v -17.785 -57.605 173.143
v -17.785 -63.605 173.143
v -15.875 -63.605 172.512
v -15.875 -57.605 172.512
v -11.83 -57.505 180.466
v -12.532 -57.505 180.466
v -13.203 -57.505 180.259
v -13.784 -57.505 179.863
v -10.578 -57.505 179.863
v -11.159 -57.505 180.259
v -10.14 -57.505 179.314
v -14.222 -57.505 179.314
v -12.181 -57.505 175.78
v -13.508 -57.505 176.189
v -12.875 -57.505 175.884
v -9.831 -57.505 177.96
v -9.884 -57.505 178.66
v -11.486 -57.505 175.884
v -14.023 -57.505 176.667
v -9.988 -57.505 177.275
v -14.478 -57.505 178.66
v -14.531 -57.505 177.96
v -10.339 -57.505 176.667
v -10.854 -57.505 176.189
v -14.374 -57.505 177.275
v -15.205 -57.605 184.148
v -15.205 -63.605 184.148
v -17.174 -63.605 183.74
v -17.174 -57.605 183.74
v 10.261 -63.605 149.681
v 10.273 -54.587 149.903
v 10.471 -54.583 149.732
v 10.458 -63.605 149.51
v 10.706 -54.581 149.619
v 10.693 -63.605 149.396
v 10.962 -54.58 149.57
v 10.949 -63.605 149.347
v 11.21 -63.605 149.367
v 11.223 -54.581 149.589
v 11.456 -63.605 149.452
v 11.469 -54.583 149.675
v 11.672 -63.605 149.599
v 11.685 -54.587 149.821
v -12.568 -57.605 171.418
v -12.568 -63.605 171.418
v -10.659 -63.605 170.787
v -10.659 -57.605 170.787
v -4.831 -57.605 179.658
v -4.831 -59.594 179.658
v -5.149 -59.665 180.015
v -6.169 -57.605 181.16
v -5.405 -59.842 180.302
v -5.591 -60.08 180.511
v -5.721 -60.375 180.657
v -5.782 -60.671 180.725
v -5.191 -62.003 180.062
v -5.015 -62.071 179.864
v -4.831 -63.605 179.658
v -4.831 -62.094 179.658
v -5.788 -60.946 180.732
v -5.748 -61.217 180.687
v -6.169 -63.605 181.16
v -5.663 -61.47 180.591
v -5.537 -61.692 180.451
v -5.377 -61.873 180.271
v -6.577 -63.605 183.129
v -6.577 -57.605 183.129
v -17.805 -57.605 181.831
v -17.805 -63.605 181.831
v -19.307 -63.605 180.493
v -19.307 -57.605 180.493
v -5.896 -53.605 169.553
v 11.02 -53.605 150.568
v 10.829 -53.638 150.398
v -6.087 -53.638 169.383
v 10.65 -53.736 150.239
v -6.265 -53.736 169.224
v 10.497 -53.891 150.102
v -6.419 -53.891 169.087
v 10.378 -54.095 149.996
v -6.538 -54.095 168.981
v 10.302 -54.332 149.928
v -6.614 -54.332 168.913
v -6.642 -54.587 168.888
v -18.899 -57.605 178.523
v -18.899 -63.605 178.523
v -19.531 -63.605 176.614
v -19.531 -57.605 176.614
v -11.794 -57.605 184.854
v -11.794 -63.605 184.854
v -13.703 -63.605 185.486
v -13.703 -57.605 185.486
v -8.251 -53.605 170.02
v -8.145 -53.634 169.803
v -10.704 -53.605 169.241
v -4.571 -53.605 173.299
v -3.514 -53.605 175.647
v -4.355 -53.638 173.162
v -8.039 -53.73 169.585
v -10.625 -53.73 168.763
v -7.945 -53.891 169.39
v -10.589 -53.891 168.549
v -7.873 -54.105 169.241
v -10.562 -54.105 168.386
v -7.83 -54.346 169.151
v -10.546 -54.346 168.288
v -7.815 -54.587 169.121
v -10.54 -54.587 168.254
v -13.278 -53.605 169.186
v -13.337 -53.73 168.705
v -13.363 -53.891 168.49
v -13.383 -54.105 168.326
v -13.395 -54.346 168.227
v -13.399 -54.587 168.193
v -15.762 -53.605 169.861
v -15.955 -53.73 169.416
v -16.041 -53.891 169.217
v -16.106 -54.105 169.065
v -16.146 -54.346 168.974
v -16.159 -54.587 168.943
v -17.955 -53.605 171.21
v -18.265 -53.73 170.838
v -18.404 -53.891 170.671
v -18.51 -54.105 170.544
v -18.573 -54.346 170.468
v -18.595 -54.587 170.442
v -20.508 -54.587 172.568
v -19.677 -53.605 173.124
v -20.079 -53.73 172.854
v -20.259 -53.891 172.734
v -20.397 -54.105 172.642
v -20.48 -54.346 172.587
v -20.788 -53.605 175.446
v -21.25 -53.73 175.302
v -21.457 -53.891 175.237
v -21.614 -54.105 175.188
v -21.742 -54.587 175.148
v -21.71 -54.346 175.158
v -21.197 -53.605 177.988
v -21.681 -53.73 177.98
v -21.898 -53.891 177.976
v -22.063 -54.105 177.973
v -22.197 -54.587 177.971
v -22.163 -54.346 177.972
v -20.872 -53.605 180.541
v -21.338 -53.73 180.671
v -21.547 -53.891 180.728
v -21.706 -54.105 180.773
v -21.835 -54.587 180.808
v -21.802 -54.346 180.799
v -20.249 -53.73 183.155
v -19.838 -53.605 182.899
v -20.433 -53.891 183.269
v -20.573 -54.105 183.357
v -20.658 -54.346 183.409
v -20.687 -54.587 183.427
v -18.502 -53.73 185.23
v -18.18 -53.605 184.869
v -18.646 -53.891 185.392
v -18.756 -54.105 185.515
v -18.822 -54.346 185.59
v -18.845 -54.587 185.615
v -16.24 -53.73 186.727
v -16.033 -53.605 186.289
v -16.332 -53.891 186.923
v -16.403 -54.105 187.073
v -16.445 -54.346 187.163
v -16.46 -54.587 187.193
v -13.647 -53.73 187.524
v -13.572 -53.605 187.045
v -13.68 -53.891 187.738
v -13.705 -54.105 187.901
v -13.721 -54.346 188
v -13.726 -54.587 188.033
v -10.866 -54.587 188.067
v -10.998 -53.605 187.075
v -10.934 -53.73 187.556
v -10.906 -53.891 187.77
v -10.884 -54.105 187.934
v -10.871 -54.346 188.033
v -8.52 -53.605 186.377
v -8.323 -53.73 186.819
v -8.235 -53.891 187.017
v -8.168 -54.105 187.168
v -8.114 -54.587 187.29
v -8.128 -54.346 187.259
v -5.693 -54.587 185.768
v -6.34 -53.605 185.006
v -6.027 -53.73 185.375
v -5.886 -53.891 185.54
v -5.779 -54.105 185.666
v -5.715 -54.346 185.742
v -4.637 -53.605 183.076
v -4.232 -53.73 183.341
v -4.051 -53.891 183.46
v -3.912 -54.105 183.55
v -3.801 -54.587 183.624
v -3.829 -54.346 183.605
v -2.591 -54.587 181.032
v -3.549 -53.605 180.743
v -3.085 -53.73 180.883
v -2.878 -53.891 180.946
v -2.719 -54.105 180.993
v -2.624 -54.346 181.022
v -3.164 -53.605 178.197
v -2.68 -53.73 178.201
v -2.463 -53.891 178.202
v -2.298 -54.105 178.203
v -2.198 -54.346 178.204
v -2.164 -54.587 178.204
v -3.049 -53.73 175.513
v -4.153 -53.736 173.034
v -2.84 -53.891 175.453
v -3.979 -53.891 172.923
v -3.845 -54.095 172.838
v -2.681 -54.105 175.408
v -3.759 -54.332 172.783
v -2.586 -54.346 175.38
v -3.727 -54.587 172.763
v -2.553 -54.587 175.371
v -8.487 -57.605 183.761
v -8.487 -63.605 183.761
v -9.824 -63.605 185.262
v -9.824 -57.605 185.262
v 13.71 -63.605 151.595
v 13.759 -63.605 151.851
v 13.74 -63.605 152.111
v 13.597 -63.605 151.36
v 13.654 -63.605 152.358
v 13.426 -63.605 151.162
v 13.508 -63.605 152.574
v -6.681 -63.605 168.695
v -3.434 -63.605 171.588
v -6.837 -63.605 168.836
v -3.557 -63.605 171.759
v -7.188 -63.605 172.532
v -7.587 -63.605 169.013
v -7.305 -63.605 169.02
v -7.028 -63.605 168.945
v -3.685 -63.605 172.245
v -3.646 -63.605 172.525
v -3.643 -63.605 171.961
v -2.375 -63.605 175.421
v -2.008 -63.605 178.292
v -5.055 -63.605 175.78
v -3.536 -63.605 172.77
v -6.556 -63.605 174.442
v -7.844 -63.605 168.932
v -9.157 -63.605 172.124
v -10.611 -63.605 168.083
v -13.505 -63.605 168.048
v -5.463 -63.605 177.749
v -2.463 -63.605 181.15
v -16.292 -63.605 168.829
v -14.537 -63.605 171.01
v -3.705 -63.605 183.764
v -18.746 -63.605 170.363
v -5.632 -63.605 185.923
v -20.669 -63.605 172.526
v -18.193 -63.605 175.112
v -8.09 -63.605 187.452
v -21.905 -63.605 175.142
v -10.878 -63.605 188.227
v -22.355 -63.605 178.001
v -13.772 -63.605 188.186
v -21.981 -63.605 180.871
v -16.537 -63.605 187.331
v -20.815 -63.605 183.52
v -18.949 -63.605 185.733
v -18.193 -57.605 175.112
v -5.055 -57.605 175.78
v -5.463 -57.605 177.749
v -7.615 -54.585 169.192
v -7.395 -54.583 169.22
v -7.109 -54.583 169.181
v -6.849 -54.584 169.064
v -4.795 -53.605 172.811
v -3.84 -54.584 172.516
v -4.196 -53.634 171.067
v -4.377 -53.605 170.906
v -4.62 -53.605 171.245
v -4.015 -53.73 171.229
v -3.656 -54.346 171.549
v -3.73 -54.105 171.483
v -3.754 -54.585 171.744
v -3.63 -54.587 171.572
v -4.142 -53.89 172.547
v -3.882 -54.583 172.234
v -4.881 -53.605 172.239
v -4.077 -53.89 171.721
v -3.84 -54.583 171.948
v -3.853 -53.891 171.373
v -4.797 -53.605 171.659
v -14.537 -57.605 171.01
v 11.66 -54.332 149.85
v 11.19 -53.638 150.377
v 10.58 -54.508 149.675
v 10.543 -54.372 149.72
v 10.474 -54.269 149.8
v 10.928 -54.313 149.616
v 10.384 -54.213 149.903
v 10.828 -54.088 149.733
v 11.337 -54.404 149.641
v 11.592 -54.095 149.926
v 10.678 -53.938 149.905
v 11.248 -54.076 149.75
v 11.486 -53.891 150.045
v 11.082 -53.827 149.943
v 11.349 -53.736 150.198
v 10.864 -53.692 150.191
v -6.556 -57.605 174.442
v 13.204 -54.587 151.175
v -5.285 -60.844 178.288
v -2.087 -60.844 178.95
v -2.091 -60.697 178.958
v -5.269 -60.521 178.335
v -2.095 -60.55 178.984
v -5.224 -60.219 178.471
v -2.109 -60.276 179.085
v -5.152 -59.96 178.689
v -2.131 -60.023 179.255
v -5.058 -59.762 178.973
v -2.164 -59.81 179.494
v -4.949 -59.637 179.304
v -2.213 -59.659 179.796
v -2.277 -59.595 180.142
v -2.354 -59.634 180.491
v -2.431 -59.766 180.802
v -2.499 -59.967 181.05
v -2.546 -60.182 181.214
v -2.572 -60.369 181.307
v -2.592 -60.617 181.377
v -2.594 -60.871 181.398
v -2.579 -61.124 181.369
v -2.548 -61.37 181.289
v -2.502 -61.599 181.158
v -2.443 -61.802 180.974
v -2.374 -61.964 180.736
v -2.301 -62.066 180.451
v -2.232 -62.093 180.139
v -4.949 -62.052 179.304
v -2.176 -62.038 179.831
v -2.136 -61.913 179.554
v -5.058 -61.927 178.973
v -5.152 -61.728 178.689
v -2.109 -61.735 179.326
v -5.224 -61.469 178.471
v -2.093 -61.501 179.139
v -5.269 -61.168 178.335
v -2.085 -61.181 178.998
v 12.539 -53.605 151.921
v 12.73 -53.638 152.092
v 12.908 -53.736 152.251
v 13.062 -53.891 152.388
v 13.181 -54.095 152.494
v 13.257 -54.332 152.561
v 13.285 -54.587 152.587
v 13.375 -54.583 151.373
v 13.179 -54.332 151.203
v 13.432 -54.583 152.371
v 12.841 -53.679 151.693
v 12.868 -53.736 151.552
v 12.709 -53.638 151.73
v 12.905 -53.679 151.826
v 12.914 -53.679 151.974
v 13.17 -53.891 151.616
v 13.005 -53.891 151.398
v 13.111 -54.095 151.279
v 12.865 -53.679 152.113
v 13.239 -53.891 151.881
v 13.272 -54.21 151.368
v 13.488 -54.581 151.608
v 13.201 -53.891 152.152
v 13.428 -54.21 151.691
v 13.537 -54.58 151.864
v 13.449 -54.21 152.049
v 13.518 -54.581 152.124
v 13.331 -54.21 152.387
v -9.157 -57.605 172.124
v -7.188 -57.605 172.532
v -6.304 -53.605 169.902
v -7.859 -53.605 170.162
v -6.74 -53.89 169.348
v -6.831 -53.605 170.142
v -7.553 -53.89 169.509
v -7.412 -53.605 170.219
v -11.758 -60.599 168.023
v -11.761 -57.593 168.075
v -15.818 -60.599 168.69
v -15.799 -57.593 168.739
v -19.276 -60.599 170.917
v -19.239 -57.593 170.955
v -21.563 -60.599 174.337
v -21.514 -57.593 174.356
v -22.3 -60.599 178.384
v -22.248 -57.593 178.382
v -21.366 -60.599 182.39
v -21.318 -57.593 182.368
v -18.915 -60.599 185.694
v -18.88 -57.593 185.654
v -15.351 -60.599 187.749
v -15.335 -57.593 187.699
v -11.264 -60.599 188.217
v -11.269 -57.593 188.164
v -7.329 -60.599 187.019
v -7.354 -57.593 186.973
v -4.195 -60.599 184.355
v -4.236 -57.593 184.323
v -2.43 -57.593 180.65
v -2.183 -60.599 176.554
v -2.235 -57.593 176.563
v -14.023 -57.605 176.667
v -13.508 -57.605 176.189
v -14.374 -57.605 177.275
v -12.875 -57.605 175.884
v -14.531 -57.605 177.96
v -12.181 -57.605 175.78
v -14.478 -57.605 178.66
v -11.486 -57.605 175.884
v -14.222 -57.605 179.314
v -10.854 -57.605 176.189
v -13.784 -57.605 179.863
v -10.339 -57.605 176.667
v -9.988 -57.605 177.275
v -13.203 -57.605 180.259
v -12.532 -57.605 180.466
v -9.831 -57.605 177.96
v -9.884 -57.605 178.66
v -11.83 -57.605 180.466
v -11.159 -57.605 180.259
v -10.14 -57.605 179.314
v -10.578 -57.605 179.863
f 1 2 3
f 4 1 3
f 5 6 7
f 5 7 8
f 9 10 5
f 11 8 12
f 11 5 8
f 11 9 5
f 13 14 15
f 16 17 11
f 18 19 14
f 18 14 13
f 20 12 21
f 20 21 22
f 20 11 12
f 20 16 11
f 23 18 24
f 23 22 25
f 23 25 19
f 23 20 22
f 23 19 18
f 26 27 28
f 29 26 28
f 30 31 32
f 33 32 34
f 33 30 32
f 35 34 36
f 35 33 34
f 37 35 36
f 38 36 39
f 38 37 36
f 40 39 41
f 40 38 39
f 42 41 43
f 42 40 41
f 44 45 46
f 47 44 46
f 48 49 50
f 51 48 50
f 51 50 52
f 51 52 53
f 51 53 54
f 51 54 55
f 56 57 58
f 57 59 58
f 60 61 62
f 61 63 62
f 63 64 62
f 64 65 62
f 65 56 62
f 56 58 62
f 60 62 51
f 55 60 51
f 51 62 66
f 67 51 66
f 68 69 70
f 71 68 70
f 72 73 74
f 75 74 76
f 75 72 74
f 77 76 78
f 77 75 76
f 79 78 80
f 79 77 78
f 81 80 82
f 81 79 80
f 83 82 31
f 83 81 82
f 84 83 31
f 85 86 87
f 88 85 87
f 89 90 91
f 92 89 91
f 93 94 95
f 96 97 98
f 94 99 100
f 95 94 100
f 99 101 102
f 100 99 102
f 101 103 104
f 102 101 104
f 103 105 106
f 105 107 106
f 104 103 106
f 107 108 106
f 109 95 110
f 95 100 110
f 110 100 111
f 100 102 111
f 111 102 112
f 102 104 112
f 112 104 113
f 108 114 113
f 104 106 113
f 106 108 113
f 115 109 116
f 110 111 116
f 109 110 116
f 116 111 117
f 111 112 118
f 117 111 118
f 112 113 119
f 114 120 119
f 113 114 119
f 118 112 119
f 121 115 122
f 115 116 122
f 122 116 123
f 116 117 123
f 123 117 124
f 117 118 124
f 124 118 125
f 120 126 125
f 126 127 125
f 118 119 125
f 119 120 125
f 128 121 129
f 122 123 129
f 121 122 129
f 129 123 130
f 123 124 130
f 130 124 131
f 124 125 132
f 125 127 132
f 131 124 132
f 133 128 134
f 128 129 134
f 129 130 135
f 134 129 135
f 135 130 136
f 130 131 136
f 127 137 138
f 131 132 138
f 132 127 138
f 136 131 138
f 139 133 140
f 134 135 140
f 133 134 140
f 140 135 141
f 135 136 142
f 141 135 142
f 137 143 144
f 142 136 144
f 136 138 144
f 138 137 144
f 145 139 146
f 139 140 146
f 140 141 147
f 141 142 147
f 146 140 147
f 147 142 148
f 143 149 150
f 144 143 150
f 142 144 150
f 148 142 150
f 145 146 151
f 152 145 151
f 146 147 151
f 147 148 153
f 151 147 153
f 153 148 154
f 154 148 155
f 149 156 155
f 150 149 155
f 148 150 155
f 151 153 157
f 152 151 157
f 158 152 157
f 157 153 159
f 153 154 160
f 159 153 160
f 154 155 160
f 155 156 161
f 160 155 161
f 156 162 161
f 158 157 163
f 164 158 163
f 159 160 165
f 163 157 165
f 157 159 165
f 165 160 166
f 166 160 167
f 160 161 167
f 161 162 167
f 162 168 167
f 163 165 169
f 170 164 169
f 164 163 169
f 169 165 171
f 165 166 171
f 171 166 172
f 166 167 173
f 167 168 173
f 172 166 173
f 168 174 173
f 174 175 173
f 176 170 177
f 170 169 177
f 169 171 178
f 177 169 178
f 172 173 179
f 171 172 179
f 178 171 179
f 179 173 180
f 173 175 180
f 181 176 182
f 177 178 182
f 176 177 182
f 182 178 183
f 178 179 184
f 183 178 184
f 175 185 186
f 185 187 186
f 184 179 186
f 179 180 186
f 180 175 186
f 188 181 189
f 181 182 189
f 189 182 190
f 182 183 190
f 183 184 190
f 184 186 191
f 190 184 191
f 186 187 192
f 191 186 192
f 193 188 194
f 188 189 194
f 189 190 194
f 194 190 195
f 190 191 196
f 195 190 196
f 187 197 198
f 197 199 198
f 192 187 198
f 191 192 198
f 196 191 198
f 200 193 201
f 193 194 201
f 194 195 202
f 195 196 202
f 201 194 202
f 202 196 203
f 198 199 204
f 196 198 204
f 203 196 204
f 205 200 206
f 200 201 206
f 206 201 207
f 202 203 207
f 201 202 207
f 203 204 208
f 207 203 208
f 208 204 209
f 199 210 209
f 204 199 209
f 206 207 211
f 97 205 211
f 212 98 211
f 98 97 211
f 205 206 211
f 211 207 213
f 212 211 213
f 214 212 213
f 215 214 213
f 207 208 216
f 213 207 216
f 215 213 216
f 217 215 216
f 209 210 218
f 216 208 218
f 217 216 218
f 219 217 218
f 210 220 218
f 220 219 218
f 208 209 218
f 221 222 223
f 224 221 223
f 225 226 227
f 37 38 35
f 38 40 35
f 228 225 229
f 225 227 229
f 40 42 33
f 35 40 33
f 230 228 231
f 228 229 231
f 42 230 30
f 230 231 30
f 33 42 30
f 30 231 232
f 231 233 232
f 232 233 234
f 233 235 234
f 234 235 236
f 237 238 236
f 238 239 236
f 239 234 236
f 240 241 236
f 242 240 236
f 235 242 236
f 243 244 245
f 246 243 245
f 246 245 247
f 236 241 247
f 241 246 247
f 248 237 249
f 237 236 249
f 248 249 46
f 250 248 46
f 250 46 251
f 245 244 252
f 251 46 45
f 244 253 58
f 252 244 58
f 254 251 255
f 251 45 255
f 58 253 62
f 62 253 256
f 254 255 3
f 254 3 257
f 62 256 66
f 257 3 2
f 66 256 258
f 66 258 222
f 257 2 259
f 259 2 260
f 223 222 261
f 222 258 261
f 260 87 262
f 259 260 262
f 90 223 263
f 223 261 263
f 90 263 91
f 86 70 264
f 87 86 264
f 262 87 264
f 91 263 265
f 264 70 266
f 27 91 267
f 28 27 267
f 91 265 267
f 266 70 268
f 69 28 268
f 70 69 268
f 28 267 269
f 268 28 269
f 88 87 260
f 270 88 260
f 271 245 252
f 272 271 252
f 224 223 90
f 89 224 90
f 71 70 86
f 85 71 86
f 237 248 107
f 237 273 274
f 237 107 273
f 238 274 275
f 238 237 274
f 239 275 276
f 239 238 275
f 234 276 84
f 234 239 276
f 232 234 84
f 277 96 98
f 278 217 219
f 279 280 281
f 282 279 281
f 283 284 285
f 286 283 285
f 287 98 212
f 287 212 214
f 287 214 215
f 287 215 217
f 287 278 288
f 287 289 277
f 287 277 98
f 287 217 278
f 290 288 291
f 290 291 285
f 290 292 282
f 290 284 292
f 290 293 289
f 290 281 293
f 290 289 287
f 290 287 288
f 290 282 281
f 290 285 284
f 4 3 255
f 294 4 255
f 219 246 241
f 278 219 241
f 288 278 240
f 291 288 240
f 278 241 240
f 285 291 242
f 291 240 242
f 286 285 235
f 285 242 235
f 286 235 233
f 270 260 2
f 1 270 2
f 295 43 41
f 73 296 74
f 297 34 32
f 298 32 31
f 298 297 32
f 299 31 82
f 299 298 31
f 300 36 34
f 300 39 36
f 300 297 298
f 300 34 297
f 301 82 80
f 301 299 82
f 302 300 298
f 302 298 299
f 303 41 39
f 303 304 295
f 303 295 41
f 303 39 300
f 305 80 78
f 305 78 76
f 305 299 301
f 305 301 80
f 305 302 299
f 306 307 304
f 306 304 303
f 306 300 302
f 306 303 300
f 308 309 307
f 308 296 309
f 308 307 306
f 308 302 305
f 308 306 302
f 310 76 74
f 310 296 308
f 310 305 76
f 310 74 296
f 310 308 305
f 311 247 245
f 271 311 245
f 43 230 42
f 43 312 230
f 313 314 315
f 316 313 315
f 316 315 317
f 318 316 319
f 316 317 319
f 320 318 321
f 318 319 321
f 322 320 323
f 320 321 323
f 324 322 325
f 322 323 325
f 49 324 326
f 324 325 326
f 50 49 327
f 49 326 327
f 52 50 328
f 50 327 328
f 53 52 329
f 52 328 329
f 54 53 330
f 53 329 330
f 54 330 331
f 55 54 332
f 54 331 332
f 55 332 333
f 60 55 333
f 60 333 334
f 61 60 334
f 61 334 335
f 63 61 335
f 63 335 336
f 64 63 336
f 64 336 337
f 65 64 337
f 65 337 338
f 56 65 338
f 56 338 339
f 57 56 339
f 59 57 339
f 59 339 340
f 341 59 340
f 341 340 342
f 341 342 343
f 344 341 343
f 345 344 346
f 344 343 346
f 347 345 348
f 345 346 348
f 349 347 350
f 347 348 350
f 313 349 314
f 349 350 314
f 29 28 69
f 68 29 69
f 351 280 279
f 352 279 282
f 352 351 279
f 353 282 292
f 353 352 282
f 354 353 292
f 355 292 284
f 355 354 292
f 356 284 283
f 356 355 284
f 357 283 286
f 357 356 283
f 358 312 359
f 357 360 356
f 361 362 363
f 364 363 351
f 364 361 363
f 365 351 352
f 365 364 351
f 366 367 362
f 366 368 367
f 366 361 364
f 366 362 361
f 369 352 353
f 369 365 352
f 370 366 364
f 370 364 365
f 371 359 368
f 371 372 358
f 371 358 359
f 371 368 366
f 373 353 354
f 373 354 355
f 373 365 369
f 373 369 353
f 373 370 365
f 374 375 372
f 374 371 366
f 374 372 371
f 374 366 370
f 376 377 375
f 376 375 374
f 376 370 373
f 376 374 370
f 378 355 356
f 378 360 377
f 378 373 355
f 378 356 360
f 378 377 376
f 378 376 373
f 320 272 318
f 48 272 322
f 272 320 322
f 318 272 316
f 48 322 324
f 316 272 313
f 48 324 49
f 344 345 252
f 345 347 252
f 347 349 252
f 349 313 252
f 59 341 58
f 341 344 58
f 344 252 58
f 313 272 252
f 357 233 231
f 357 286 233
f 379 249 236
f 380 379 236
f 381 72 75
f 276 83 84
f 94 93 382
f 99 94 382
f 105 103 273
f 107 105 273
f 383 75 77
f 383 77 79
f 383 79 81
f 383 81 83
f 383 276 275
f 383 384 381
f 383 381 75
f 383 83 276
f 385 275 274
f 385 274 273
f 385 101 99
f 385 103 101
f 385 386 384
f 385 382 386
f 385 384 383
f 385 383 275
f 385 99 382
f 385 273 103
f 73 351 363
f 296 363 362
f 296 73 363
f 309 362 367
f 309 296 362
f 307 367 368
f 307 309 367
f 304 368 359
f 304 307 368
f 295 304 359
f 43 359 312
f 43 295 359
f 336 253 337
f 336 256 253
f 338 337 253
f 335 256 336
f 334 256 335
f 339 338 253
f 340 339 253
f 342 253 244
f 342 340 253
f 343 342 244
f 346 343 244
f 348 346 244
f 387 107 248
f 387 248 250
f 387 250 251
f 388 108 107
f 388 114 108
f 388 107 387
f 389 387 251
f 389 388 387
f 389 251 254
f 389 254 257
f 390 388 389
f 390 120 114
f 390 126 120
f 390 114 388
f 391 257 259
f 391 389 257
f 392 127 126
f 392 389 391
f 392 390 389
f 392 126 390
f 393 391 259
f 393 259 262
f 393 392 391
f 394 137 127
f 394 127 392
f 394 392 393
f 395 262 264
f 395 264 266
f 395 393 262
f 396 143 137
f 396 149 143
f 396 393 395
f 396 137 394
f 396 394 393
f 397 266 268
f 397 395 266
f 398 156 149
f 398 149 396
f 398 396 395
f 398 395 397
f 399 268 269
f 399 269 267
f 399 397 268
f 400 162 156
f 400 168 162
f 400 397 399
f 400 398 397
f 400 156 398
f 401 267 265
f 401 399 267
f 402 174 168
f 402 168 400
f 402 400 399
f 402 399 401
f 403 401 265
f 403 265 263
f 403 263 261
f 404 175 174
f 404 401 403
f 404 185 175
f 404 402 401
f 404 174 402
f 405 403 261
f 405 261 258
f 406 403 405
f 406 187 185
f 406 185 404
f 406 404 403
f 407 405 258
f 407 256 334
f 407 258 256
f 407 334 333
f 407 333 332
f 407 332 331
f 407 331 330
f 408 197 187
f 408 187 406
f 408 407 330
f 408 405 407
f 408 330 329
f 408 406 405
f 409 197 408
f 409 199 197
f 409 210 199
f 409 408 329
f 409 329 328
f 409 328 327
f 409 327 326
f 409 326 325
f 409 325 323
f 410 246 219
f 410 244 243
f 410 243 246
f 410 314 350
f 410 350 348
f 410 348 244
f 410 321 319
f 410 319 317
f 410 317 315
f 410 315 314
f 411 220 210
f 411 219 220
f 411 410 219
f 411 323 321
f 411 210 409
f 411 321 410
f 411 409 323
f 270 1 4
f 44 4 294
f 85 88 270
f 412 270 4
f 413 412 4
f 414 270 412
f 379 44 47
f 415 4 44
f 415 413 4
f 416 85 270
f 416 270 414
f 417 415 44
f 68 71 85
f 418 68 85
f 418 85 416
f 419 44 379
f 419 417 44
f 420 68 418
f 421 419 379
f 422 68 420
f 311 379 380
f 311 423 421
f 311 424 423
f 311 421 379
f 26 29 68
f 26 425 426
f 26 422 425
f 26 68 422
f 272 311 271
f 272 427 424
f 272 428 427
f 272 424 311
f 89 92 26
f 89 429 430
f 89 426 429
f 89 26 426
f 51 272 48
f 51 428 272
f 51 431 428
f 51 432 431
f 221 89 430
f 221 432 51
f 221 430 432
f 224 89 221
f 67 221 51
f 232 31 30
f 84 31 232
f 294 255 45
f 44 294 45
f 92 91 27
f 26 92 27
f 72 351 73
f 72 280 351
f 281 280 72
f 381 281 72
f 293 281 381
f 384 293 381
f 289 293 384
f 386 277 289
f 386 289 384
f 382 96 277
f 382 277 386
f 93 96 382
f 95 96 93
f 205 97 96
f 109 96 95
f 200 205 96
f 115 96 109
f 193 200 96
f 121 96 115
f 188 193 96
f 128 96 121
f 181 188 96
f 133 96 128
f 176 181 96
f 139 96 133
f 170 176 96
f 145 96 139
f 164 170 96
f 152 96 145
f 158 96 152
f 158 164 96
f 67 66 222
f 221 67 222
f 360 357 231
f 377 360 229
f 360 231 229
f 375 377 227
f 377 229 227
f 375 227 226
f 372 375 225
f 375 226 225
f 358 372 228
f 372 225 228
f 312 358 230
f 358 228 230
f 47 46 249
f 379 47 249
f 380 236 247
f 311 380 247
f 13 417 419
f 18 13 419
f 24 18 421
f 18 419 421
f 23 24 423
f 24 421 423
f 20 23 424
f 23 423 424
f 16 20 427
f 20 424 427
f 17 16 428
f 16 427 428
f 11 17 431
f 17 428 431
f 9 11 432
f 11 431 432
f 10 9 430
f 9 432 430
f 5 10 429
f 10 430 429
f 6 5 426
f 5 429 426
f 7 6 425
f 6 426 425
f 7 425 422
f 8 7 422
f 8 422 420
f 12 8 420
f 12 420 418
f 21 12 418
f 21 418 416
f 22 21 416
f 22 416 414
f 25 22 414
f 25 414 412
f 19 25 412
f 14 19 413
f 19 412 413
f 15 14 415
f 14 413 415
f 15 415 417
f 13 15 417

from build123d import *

# Parameters (mm, degrees)
BOSS_EXTRU_1_DEPTH      = 10
BOSS_EXTRU_1_DRAFT      = 1
PER_AGE1_D              = 13
PER_AGE1_DEPTH          = 6
CONG_1_R                = 0.991556173
CONG_2_R                = 0.991556172
CONG_3_R                = 1
ENL_V_MAT_EXTRU_1_DEPTH = 6
ESQUISSE7_R             = 2.35630159
ENL_V_MAT_EXTRU_2_DEPTH = 0.1
TROU_TARAUD_M31_D       = 2.5
TROU_TARAUD_M31_DEPTH   = 8.5
TROU_TARAUD_M31_TIP     = 0.751075774


with BuildPart() as part:
    # Esquisse1 → Boss.-Extru.1 (with draft: the straight prism first)
    with BuildSketch(Plane(origin=(0, -53.604561249, 0), x_dir=(-1, 0, 0), z_dir=(0, 1, 0))):
        with BuildLine():
            Line((4.169645588, 172.151181972), (-13.92635809, 151.841438325))
            Line((-13.92635809, 151.841438325), (-10.939855184, 149.180460987))
            Line((-10.939855184, 149.180460987), (7.156148495, 169.490204634))
            ThreePointArc((7.156148495, 169.490204634), (18.83337708, 185.602358804), (4.169645588, 172.151181972))
        make_face()
    extrude(amount=-BOSS_EXTRU_1_DEPTH)
    # Boss.-Extru.1: the draft: its side faces are tilted about the plane it starts from
    boss_extru_1_sides = [part.faces().sort_by_distance(p)[0] for p in [
        (4.878356251, -58.604561249, 161.996310148),
        (12.433106637, -58.604561249, 150.510949656),
        (1.891853345, -58.604561249, 159.33533281),
        (-18.83337708, -58.604561249, 185.602358804),
    ]]
    draft(boss_extru_1_sides, Plane(origin=(0, -53.604561249, 0), x_dir=(-1, 0, 0), z_dir=(0, 1, 0)), BOSS_EXTRU_1_DRAFT)

    # Perçage1
    with Locations(Plane.XZ.offset(63.604561249)):
        with Locations((-12.180933736, 178.136101538)):
            Hole(PER_AGE1_D / 2, depth=PER_AGE1_DEPTH)

    # Congé1
    cong_1_edges = [part.edges().sort_by_distance(p)[0] for p in [
        (-7.174076316, -58.604557662, 169.379132828),
    ]]
    fillet(cong_1_edges, radius=CONG_1_R)

    # Congé2
    cong_2_edges = [part.edges().sort_by_distance(p)[0] for p in [
        (-4.057249498, -58.604557662, 172.156228913),
    ]]
    fillet(cong_2_edges, radius=CONG_2_R)

    # Congé3
    cong_3_edges = [part.edges().sort_by_distance(p)[0] for p in [
        (14.049579508, -58.604561249, 151.834335737),
        (12.433106637, -53.604561249, 150.510949656),
        (10.932752597, -58.604561249, 149.057239569),
        (5.137318128, -53.604561249, 161.705668665),
        (2.150815222, -53.604561249, 159.044691328),
        (-3.899737977, -53.604561249, 172.149959021),
        (-7.185946015, -53.604561249, 169.221944085),
        (-18.83337708, -53.604561249, 185.602358804),
    ]]
    fillet(cong_3_edges, radius=CONG_3_R)

    # Esquisse6 → Enlèv. mat.-Extru.1 (cut)
    with BuildSketch(Plane.XZ.offset(63.604561249)):
        Polygon((-6.577094401, 183.12912848), (-8.486502447, 183.760565155), (-9.824379984, 185.262109379), (-11.793694196, 184.854245557), (-13.703102242, 185.485682232), (-15.204646466, 184.147804695), (-17.173960678, 183.739940873), (-17.805397352, 181.830532827), (-19.306941577, 180.49265529), (-18.899077755, 178.523341078), (-19.530514429, 176.613933032), (-18.192636892, 175.112388808), (-17.78477307, 173.143074596), (-15.875365024, 172.511637922), (-14.537487487, 171.010093697), (-12.568173276, 171.417957519), (-10.658765229, 170.786520845), (-9.157221005, 172.124398382), (-7.187906794, 172.532262204), (-6.556470119, 174.44167025), (-5.054925895, 175.779547787), (-5.462789717, 177.748861998), (-4.831353042, 179.658270044), (-6.169230579, 181.159814269), align=None)
    extrude(amount=-ENL_V_MAT_EXTRU_1_DEPTH, mode=Mode.SUBTRACT)

    # Esquisse7 → Enlèv. mat.-Extru.2 (cut)
    with BuildSketch(Plane.XZ.offset(57.604561249)):
        with Locations(Location((-12.180933736, 178.136101538, 0), (0, 0, 270))):
            Circle(ESQUISSE7_R)
    extrude(amount=-ENL_V_MAT_EXTRU_2_DEPTH, mode=Mode.SUBTRACT)

    # Trou taraudé M31
    with Locations(Plane(origin=(30.587175126, -0.239784127, 3.6865788), x_dir=(-0.20280563003866656, 0, 0.9792190135126153), z_dir=(-0.9792190135126153, 0, -0.20280563003866656))):
        with Locations((179.497902827, -60.604561249)):
            Hole(TROU_TARAUD_M31_D / 2, depth=TROU_TARAUD_M31_DEPTH)
            with Locations((0, 0, -(TROU_TARAUD_M31_DEPTH + TROU_TARAUD_M31_TIP / 2))):  # 118° drill point
                Cone(0, TROU_TARAUD_M31_D / 2, TROU_TARAUD_M31_TIP, mode=Mode.SUBTRACT)


solid = part.part
